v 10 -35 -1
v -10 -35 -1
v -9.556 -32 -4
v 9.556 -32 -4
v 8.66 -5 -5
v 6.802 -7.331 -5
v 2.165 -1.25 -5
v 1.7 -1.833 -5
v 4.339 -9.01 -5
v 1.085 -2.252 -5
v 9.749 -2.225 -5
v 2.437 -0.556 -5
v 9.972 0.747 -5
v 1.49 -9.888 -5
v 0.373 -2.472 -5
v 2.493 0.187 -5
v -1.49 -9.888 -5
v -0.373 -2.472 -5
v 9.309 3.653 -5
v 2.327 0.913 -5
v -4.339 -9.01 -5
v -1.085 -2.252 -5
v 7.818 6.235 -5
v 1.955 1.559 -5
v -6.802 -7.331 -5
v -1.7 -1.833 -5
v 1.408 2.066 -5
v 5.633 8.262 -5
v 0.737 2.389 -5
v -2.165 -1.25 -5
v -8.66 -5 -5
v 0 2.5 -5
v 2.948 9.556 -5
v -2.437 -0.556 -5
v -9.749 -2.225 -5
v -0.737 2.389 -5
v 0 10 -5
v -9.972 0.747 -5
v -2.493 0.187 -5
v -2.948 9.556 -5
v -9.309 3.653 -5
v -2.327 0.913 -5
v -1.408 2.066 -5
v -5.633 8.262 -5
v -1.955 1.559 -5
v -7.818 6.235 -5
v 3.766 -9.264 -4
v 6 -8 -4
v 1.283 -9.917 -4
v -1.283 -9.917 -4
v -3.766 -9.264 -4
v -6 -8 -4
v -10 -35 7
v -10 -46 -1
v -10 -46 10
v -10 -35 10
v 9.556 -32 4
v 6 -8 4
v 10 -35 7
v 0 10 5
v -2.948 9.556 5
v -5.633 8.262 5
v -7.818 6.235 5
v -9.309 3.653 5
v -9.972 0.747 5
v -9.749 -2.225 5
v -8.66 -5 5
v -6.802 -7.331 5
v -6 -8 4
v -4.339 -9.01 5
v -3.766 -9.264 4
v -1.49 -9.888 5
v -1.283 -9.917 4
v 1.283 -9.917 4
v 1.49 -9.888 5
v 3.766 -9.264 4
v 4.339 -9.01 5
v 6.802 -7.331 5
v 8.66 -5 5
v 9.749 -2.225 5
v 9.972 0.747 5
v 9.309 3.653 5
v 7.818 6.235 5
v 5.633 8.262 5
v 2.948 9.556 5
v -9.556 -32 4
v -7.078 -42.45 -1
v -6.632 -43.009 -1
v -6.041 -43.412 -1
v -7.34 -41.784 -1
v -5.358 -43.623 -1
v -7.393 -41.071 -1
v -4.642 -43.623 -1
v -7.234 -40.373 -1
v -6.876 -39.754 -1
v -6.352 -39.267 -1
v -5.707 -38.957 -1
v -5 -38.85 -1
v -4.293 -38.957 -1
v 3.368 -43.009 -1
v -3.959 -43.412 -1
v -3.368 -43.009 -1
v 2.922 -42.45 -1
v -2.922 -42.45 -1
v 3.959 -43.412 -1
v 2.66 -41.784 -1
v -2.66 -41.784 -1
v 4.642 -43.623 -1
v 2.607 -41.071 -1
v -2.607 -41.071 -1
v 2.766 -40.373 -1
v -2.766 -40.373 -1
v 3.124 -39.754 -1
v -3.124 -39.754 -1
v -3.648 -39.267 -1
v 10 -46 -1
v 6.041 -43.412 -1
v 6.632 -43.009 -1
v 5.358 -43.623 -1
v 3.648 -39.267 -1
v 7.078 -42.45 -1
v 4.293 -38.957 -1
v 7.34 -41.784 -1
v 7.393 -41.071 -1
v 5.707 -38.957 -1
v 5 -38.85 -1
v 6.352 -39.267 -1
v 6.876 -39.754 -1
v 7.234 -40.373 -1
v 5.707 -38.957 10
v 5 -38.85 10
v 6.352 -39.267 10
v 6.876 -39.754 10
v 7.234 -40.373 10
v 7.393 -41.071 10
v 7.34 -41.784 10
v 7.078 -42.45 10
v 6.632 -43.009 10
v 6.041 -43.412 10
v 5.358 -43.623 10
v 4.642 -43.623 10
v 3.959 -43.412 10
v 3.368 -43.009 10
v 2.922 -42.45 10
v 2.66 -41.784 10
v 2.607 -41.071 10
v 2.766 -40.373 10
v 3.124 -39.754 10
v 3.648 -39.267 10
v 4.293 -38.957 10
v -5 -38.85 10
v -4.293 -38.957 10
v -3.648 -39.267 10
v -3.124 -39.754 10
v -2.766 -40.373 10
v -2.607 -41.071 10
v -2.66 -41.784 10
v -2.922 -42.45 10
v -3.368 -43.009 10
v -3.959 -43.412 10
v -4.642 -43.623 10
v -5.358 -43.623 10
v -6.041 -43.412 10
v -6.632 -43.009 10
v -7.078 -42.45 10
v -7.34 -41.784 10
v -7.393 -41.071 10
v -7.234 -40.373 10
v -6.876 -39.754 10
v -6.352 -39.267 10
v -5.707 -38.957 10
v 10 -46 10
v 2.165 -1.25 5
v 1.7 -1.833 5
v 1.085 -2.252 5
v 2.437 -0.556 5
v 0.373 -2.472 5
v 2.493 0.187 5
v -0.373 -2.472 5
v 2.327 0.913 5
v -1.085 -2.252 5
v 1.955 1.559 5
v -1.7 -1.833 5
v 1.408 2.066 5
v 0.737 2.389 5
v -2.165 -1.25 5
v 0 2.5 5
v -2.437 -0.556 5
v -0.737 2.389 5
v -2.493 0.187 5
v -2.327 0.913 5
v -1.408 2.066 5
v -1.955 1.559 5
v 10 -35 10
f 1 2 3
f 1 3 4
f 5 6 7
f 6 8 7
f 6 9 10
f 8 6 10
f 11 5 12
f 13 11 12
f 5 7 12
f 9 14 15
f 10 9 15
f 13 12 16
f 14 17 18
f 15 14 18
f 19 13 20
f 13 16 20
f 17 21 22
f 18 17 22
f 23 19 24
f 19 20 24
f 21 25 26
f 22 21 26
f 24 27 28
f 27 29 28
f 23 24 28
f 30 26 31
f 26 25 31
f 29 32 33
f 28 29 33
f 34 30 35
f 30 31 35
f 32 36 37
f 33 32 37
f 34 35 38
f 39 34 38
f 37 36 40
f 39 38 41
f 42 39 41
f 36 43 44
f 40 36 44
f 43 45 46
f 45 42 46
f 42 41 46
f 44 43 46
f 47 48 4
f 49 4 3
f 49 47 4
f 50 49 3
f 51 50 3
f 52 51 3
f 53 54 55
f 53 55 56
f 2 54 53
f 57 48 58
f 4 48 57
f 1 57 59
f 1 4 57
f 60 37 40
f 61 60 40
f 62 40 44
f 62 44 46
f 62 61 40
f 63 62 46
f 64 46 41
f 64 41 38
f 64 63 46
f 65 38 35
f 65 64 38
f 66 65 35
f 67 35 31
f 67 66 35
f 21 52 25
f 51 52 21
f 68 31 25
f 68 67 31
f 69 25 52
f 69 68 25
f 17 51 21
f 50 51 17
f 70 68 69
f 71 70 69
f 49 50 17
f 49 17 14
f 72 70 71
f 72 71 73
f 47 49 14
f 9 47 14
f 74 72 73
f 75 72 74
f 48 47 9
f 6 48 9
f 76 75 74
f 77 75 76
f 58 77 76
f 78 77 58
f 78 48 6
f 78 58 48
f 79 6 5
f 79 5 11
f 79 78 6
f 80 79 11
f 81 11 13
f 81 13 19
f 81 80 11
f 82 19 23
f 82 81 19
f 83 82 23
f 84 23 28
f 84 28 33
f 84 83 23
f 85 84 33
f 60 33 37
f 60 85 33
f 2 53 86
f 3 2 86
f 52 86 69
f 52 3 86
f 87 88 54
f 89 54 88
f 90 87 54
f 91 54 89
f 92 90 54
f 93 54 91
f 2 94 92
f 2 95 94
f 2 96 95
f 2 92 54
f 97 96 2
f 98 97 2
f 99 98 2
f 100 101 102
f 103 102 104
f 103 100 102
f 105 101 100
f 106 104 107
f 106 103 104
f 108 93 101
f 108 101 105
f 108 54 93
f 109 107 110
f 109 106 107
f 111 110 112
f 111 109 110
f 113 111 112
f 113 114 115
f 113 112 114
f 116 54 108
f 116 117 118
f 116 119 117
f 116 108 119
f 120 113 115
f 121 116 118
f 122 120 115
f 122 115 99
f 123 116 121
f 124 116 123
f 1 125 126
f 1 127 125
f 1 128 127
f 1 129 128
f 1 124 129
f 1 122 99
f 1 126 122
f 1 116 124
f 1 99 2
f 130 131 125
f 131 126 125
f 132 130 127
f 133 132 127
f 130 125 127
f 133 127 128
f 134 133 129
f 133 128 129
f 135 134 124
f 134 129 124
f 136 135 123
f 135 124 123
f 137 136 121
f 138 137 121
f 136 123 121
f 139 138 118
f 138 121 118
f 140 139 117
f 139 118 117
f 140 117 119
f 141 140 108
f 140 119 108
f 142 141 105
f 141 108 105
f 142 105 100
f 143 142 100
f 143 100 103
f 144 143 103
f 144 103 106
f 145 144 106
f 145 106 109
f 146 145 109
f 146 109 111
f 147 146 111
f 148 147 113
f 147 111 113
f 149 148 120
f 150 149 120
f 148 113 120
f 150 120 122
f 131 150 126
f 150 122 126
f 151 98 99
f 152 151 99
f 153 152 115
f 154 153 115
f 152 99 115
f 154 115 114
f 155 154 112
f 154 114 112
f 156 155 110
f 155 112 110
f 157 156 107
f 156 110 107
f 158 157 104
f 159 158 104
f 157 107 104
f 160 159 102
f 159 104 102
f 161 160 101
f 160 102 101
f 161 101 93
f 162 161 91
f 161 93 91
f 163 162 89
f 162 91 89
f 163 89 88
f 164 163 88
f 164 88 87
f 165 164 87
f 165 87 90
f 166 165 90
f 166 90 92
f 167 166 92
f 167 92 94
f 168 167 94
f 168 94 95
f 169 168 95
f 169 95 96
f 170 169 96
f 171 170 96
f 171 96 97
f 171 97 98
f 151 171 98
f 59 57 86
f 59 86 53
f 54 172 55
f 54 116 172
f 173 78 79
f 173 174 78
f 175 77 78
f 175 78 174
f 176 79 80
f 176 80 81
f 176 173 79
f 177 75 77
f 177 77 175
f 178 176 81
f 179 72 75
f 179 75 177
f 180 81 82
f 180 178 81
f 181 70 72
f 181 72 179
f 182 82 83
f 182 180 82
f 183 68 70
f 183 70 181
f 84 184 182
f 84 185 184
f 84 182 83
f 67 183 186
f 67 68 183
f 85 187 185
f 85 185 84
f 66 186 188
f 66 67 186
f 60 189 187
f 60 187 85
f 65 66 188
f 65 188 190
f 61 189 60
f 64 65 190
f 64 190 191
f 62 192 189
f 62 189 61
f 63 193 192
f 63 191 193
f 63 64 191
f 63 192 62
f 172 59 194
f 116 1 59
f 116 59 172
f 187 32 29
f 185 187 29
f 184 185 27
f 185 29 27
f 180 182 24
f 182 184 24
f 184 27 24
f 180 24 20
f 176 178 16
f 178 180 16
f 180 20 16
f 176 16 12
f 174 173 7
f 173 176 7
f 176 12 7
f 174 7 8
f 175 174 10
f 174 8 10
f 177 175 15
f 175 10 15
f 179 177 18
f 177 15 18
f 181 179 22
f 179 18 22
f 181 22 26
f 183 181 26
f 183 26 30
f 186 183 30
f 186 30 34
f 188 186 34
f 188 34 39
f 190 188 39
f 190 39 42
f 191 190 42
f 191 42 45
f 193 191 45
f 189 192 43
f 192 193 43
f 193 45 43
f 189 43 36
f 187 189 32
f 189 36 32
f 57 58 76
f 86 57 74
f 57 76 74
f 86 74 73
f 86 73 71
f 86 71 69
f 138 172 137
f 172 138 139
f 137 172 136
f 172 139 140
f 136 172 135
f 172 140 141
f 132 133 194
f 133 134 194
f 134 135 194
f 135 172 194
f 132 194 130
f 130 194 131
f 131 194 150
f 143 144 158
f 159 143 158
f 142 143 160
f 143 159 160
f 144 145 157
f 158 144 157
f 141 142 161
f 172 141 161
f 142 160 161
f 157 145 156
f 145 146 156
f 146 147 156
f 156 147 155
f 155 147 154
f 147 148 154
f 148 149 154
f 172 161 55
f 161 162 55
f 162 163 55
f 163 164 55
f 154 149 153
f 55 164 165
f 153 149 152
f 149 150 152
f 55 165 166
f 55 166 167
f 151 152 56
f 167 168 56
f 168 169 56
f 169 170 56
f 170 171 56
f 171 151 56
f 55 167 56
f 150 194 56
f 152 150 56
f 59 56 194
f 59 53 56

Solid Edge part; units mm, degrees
sketch "Sketch1" plane through (0, 0, 0) normal (1, 0, 0) x (0, 1, 0)
  line L0 (2.5, 5) -> (2.5, -5)
  line L1 (2.5, -5) -> (10, -5)
  line L2 (10, -5) -> (10, 5)
  line L3 (10, 5) -> (2.5, 5)
  dimension "D1" = 10
revolve "RevolvedProtrusion1" add sketch "Sketch1" angle 360 about axis through (0, 0, -57) along (0, 0, 1)
sketch "Sketch2" plane through (0, 0, 0) normal (0, 0, 1) x (1, 0, 0)
  line L0 (-6, -8) -> (6, -8)
  line L1 (6, -8) -> (10, -35)
  line L2 (10, -35) -> (10, -46)
  line L3 (10, -46) -> (-10, -46)
  line L4 (-10, -46) -> (-10, -35)
  line L5 (-10, -35) -> (-6, -8)
  dimension "D1" = 20
  dimension "D2" = 12
  dimension "D3" = 35
  dimension "D4" = 46
extrude "Protrusion1" add sketch "Sketch2" along normal mid plane 8
sketch "Sketch3" plane through (0, -29, 4) normal (0, 0, 1) x (1, 0, 0)
  line L0 (-10, -17) -> (-10, -6)
  line L1 (-10, -6) -> (10, -6)
  line L2 (10, -6) -> (10, -17)
  line L3 (10, -17) -> (-10, -17)
extrude "ExtrudedProtrusion_2" add sketch "Sketch3" along normal blind 6
hole "Hole_1" at (5, -41.25, -4) direction (0, 0, 1) diameter 4.8 end up to next
hole "Hole1" at (-5, -41.25, -4) direction (0, 0, 1) diameter 4.8 end up to next
sketch "Sketch4" plane through (10, -42.5, 0) normal (1, 0, 0) x (0, 0, -1)
  line L0 (1, -3.5) -> (1, 7.5)
  line L1 (1, 7.5) -> (4, 7.5)
  line L2 (4, 7.5) -> (4, -3.5)
  line L3 (4, -3.5) -> (1, -3.5)
  dimension "D1" = 3
extrude "Cutout1" cut sketch "Sketch4" against normal up to next
chamfer "Chamfer1" distance 3 angle 45 2 edges at (0, -35, -4) (0, -35, 4)
properties material "Polyethylene, low density"
